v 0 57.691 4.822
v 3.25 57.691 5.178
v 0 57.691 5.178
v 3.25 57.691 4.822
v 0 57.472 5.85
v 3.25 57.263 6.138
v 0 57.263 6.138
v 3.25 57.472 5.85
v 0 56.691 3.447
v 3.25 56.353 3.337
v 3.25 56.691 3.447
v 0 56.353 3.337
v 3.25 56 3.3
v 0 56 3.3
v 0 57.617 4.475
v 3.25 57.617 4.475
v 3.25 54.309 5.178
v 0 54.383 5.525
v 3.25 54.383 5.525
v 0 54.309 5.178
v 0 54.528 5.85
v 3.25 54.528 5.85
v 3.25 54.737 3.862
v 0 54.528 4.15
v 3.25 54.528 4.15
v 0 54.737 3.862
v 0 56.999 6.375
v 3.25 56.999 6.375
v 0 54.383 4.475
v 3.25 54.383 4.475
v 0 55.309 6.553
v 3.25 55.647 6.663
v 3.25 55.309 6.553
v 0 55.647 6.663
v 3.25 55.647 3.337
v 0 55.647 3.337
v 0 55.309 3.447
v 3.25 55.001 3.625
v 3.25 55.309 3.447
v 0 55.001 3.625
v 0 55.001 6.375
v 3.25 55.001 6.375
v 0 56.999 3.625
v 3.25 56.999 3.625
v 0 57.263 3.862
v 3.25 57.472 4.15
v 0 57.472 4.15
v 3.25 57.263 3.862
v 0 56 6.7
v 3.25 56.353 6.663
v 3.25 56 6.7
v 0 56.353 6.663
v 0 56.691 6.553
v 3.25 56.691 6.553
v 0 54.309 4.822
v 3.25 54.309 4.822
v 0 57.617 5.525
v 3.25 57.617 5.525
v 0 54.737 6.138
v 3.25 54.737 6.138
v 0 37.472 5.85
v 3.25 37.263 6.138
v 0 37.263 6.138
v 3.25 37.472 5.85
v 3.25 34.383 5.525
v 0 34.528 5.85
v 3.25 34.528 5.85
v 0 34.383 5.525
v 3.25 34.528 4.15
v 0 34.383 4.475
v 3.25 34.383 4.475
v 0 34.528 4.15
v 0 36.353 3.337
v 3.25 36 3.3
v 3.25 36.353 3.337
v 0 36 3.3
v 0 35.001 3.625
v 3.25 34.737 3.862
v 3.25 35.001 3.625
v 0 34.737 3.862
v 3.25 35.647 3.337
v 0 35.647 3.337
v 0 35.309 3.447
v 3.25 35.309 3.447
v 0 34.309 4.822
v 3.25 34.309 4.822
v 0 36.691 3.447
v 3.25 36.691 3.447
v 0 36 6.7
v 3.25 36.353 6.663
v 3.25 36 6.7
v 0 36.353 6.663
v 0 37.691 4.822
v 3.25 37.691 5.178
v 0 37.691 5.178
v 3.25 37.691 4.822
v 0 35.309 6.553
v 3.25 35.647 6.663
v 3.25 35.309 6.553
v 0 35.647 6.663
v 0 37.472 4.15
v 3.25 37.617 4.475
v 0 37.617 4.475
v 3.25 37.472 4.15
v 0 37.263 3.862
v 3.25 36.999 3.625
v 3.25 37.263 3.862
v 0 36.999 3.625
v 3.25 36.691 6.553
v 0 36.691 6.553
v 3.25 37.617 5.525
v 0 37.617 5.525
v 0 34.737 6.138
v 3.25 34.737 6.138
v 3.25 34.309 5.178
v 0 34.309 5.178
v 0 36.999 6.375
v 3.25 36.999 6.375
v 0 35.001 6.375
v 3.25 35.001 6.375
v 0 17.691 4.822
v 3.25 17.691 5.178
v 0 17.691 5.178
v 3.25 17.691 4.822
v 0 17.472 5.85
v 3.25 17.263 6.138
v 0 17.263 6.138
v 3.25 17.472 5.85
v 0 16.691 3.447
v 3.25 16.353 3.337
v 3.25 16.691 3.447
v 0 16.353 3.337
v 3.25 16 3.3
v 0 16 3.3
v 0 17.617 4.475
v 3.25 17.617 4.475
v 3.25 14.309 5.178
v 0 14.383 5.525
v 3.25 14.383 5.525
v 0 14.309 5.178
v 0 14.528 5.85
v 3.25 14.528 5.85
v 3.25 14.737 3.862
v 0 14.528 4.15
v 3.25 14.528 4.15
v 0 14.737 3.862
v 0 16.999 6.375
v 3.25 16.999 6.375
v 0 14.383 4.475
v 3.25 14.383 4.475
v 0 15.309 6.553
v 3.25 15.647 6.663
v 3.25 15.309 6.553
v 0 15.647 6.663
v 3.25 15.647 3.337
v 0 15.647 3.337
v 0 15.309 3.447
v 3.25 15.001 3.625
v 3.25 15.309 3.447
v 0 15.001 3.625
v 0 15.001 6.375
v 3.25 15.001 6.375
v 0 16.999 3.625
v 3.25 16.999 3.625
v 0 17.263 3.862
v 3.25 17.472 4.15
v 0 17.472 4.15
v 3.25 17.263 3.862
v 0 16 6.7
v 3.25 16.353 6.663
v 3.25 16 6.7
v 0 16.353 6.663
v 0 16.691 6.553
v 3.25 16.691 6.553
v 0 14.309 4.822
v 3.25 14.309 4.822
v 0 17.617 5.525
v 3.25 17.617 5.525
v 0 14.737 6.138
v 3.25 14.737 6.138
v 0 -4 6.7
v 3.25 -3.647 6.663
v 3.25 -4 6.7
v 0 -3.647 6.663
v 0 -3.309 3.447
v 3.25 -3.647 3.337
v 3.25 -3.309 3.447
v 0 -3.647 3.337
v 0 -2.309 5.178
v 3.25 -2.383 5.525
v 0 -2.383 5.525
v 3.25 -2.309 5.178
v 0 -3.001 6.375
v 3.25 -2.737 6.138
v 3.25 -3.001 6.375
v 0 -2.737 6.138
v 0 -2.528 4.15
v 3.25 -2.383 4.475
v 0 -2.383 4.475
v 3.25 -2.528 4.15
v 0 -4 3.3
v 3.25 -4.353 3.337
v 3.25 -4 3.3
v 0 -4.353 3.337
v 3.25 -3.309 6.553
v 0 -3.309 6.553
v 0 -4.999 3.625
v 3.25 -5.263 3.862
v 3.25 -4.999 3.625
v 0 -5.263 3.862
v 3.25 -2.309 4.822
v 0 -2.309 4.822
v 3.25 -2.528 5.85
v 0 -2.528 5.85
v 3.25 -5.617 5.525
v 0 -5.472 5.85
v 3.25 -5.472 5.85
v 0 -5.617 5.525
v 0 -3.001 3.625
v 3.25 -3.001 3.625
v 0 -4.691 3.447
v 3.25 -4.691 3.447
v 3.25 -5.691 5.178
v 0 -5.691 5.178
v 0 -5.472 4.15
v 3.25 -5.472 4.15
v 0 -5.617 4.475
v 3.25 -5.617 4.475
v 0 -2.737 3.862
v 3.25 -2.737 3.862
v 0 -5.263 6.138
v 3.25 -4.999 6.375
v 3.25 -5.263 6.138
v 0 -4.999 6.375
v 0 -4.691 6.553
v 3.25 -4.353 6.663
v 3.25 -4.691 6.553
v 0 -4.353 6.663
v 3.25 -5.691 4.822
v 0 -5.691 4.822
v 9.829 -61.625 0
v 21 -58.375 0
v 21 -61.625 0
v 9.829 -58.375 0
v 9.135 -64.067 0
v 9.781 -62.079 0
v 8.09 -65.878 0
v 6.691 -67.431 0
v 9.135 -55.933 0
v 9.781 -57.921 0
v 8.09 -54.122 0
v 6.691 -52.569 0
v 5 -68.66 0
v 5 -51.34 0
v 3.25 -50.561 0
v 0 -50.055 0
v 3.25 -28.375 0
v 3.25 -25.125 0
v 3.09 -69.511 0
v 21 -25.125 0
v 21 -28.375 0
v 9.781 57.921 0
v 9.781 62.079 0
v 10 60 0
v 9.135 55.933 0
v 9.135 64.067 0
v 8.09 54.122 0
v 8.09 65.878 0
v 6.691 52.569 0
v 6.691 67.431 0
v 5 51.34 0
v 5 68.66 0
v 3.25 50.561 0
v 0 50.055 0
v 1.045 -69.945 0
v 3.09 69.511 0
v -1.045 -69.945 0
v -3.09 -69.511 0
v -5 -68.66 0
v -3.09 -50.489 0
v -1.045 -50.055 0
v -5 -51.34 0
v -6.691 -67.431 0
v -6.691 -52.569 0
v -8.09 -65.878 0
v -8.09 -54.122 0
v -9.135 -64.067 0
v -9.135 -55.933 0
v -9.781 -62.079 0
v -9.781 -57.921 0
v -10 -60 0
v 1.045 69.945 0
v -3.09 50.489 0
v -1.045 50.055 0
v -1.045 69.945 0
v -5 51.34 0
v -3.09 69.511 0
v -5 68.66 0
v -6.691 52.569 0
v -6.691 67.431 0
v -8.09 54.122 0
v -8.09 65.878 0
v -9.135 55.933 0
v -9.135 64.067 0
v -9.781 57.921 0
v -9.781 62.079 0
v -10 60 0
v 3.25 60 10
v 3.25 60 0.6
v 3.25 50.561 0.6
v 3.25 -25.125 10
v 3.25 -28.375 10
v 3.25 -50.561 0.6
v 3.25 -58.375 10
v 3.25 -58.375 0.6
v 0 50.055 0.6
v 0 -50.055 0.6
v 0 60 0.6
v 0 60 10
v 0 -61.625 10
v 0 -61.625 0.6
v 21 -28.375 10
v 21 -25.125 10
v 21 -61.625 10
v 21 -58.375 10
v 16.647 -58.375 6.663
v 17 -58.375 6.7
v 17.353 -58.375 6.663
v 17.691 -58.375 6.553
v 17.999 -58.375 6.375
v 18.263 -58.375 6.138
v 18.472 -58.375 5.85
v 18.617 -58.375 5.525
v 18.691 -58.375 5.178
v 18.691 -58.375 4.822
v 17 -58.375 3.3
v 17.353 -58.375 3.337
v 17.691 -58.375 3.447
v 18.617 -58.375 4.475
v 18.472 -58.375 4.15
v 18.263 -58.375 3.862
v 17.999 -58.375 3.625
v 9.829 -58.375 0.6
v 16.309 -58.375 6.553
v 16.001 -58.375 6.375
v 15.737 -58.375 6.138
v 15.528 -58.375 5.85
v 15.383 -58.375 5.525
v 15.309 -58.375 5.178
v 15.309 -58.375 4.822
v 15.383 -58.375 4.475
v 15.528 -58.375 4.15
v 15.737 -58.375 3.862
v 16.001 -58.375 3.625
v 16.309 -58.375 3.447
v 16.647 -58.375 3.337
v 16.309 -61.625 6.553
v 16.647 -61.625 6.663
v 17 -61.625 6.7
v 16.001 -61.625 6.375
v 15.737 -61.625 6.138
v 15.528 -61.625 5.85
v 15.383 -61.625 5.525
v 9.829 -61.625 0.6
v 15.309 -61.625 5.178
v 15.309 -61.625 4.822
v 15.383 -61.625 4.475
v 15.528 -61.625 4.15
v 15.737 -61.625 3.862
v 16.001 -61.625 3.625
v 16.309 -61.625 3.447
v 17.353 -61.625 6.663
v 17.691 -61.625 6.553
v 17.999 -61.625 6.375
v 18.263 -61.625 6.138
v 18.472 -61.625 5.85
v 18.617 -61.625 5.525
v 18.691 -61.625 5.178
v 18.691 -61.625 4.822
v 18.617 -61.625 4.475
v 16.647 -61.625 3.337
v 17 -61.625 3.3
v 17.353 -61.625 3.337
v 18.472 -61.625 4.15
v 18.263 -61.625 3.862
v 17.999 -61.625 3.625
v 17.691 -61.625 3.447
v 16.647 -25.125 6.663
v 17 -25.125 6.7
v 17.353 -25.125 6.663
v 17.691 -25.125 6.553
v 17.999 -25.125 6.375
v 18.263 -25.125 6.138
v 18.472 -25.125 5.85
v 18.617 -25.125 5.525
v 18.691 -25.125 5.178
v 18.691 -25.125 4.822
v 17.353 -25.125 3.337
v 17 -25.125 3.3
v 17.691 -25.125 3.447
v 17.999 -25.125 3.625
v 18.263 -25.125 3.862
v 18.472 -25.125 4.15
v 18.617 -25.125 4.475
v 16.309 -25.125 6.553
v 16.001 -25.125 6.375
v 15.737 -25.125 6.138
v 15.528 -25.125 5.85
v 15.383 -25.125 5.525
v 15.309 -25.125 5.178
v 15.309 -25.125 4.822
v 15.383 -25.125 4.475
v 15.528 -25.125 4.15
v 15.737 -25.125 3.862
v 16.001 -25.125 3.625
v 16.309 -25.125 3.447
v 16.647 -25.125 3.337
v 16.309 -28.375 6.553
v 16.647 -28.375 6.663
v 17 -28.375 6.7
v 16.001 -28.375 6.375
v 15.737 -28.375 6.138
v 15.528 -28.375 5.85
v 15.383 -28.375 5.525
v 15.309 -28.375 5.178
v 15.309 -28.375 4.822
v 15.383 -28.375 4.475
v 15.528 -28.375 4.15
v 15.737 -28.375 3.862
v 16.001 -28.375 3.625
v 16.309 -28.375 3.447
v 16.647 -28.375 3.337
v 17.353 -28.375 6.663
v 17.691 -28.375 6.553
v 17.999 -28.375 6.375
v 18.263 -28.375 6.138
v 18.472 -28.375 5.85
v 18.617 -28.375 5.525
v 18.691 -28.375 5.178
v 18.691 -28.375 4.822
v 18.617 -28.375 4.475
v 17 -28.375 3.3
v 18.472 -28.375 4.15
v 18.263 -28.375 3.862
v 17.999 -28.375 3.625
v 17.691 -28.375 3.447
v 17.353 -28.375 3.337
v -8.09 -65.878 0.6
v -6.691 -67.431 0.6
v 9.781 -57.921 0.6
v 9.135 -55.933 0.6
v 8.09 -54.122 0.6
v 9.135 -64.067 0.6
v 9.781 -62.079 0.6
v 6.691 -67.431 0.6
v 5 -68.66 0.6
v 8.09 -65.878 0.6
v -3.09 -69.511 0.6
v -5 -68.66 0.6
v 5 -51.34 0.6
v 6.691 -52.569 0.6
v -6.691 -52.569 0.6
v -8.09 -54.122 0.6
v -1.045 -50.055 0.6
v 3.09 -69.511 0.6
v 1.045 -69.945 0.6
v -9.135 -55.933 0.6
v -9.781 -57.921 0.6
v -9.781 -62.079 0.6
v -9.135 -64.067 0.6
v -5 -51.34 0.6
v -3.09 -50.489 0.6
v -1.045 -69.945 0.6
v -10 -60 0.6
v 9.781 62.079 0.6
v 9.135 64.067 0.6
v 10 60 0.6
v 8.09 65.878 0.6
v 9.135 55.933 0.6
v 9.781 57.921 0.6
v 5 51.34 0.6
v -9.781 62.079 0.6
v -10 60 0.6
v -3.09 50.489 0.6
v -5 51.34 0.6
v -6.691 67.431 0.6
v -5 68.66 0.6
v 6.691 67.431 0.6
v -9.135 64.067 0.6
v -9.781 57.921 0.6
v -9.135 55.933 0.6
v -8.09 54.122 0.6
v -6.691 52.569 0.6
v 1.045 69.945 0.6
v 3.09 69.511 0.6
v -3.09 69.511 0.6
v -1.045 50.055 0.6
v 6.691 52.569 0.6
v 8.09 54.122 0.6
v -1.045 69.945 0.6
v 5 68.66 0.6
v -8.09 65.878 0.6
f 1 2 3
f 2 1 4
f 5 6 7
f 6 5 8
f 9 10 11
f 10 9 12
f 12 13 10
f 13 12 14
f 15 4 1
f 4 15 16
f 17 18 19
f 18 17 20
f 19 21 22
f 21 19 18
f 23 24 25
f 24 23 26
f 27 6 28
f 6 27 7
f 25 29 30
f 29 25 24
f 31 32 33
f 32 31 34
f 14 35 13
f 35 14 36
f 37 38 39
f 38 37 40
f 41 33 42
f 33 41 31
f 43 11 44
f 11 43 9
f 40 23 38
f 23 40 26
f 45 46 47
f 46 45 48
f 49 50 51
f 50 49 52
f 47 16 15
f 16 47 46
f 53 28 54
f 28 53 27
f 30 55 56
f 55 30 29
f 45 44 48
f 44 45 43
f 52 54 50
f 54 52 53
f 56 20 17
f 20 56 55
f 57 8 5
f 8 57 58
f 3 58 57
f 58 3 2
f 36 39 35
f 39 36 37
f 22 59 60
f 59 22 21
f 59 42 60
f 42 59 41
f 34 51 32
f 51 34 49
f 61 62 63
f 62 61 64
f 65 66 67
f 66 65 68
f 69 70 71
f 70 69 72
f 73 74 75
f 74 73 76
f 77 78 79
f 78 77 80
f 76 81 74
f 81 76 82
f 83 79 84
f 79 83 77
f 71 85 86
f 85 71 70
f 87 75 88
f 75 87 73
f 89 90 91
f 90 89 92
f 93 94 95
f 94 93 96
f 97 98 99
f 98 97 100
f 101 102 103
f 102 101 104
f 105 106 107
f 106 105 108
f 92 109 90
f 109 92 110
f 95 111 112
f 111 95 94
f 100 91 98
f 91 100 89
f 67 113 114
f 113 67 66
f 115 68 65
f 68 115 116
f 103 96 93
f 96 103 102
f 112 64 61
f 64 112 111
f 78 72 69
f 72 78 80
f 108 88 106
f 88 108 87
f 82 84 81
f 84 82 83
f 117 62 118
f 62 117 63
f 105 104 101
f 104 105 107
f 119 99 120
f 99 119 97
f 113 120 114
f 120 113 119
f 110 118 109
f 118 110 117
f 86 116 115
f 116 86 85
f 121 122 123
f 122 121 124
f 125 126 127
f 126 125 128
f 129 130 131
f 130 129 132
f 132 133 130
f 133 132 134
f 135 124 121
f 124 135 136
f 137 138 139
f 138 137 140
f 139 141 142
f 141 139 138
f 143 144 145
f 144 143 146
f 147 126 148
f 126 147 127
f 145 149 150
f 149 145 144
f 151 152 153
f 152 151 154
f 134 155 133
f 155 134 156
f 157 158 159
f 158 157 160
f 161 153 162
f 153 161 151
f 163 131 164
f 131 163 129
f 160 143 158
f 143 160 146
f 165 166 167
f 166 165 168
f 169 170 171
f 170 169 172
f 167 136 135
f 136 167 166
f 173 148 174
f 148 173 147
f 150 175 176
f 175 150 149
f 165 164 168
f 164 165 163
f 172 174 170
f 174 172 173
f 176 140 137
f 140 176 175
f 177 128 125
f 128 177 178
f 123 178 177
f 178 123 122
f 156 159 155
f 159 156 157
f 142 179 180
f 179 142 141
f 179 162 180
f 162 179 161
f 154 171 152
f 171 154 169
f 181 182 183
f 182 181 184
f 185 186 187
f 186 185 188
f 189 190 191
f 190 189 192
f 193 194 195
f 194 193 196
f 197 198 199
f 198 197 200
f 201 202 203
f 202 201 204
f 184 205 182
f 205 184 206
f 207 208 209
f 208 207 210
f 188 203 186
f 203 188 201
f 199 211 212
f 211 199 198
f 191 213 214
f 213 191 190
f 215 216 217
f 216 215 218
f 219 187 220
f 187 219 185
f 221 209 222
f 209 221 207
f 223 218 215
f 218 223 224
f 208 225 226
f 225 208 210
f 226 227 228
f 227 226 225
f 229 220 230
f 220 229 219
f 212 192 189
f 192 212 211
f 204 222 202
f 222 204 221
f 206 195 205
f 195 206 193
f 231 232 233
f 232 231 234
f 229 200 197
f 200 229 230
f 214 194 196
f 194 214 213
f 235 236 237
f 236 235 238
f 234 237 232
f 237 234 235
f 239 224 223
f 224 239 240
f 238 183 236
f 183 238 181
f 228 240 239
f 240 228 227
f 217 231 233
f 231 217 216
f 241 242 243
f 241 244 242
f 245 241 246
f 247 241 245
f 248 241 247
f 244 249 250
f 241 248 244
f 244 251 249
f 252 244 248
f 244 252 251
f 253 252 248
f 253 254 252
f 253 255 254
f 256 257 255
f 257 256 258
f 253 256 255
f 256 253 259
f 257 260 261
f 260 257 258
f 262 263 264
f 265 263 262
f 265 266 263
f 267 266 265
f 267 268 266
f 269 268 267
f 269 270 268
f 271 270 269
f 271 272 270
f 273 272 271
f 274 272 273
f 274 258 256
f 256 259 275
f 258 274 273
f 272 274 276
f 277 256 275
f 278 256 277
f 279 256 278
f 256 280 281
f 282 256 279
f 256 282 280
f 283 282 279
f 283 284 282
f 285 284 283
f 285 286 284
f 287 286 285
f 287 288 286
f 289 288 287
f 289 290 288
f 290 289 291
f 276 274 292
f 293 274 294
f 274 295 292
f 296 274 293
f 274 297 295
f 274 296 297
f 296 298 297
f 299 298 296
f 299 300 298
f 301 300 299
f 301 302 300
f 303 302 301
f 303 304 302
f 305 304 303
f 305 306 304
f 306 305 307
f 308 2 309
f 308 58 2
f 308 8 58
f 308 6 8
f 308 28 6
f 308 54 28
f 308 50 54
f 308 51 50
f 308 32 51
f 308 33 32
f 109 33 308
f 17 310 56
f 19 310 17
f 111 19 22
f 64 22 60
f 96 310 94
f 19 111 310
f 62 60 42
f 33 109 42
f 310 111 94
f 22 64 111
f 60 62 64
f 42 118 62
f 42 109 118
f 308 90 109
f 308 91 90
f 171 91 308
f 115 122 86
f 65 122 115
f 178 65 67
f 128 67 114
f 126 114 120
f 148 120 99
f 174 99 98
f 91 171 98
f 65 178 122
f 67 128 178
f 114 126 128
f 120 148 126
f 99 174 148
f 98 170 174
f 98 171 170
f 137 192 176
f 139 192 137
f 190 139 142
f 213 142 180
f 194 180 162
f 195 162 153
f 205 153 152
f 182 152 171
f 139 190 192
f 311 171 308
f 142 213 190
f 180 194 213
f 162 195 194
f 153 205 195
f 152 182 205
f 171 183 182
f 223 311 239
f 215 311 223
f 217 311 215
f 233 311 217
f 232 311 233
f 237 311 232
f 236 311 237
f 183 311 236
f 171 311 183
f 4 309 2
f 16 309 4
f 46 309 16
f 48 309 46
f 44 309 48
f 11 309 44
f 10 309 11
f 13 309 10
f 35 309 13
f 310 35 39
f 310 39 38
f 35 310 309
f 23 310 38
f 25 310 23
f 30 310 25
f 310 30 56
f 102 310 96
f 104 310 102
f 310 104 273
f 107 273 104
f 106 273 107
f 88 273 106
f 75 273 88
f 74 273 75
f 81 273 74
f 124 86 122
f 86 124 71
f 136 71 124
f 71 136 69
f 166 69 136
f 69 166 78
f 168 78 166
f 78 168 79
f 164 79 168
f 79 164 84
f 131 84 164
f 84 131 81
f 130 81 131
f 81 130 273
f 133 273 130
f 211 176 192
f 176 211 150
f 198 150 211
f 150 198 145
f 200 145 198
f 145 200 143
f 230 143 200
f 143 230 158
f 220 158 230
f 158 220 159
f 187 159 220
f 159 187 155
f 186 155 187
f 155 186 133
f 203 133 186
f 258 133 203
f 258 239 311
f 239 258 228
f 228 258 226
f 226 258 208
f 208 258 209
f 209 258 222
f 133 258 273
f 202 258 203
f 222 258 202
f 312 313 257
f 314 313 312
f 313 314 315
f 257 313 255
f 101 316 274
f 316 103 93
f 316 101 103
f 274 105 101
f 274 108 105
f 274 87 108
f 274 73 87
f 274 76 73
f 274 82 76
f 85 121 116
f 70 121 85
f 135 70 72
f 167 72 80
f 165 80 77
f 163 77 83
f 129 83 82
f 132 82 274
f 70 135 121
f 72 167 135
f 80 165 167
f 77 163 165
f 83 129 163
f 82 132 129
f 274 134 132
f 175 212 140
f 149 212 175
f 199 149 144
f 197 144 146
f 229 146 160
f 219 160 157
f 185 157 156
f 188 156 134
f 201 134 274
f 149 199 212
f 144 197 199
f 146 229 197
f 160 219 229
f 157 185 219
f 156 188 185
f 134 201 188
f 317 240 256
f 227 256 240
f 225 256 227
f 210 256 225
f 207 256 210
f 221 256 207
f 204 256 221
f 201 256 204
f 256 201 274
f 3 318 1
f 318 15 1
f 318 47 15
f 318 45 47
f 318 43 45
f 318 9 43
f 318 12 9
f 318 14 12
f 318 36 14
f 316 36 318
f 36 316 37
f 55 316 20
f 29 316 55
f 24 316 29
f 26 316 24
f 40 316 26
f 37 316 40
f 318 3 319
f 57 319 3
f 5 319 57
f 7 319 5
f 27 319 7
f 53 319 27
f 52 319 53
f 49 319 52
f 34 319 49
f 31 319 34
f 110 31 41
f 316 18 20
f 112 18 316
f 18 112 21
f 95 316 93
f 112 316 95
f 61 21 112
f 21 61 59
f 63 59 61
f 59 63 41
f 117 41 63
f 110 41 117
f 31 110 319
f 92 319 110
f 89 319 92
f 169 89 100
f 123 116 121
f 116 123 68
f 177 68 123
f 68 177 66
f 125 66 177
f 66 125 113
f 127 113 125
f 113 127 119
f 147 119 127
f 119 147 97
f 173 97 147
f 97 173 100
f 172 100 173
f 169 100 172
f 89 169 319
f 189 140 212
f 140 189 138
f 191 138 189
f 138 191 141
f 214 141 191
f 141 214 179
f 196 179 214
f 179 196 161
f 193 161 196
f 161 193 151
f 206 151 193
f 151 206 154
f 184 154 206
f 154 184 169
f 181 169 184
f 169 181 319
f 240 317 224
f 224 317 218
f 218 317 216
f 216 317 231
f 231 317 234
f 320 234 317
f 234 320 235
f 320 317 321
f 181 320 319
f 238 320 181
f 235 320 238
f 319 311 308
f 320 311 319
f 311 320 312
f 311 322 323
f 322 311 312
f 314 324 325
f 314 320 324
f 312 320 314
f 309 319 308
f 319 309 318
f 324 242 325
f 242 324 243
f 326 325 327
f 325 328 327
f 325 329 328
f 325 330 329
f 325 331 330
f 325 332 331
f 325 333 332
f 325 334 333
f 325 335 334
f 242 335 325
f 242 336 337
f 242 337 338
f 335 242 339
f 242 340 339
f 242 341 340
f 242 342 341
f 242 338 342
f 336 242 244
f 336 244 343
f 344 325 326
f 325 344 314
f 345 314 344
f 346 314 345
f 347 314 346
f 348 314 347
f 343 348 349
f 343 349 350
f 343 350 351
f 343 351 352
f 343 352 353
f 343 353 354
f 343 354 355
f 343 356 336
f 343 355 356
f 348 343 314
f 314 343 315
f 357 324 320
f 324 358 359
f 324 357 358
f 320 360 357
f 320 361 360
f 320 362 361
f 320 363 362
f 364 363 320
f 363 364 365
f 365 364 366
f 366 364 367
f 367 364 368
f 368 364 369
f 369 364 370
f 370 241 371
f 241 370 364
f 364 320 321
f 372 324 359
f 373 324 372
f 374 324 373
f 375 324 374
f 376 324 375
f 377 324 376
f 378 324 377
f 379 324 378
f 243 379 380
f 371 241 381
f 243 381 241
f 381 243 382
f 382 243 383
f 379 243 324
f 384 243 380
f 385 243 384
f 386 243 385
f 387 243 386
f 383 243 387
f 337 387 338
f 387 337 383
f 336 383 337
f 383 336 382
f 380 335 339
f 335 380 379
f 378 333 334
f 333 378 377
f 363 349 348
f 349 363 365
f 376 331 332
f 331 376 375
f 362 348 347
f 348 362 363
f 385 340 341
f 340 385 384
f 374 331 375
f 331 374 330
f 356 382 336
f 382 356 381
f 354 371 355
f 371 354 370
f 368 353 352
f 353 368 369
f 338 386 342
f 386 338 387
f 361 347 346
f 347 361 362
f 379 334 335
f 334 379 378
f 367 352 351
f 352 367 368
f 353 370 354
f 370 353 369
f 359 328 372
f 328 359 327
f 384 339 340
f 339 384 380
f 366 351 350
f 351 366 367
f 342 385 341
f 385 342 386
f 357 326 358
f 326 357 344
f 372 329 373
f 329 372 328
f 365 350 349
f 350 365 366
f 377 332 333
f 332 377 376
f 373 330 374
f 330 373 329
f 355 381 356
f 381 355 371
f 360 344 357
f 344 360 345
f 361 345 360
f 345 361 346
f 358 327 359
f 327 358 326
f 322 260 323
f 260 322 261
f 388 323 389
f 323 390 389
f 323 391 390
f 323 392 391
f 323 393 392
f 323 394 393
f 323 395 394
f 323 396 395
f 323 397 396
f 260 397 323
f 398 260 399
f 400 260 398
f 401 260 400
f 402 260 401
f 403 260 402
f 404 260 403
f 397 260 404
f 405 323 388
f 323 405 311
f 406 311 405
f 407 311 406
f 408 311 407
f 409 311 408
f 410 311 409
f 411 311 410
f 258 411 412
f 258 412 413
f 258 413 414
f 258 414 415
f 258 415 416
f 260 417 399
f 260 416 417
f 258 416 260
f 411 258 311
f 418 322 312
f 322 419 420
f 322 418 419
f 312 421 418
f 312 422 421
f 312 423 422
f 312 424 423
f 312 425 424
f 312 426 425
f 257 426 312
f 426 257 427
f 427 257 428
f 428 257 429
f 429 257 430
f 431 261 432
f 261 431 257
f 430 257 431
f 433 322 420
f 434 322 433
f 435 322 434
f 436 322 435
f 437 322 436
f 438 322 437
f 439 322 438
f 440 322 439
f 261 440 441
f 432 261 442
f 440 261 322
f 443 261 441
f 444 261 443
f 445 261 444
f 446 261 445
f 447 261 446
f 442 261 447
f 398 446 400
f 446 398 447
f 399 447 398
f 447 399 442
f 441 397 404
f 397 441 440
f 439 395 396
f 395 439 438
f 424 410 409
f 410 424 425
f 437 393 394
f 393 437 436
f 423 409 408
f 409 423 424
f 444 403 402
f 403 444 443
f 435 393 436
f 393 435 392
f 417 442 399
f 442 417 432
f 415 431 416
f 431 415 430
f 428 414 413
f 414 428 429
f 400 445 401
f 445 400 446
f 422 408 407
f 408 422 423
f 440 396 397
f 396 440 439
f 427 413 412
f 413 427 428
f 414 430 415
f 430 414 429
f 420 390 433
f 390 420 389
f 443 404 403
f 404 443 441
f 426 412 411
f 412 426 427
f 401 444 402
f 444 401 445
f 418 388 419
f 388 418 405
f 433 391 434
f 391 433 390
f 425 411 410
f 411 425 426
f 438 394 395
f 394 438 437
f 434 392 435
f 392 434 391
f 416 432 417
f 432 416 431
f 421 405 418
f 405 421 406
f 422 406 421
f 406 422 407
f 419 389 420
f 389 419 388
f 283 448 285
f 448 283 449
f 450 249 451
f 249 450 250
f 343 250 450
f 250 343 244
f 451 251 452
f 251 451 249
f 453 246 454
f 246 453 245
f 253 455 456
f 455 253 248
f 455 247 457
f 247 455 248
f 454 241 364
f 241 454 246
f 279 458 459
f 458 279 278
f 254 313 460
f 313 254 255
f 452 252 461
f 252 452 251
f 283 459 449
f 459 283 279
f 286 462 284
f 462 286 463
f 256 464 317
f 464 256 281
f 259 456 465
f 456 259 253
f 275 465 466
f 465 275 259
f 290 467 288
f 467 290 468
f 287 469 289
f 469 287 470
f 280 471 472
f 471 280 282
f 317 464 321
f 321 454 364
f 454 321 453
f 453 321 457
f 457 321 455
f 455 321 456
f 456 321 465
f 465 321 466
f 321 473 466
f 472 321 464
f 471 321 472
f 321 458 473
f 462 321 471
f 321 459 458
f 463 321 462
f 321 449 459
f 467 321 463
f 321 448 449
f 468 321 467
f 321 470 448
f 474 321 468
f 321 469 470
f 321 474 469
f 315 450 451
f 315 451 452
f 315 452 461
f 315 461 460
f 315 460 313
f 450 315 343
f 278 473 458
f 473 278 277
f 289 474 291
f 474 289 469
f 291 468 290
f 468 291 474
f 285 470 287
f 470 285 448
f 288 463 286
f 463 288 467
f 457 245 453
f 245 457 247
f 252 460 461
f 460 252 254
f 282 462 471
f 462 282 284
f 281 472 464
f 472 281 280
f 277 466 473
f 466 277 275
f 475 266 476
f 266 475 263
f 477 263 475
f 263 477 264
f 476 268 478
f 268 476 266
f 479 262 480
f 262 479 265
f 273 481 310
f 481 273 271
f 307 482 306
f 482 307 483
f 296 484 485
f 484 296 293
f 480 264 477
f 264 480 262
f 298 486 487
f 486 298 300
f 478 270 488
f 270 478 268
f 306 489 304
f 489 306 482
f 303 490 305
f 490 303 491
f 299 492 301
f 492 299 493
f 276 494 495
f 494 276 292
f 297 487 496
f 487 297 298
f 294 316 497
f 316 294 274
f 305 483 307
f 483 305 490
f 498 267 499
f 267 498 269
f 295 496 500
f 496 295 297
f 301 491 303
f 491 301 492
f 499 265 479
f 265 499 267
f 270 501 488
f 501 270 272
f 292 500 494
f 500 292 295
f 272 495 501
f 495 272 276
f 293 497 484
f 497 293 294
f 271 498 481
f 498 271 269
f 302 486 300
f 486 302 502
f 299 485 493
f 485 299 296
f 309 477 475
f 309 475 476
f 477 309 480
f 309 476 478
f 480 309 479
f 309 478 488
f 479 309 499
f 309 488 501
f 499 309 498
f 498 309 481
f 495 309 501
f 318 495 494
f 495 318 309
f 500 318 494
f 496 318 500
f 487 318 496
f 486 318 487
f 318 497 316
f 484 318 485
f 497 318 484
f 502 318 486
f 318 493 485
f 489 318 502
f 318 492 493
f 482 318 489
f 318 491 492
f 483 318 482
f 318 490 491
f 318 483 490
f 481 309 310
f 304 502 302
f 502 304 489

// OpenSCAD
//////////////////////////////////////////
// tbs discovery FPV top camera mount, LEFT SIDE, LONGER ARM, V2
//////////////////////////////////////////

module helperDisk(diameter) {
translate([0, 0, 0.3]) {
	cylinder(r = diameter/2, h = 0.6, center = true);
}
}

totalL = 120;
plateThick = 3.25;
frameThick = 10;
m3Rad = 3.4/2;
frameHoleD = 40;
frameH=21;
nholes=3;

translate([0,0,frameThick/2]){//translate all
rotate([0,90,0]){

translate([0,0,plateThick/2]){

difference(){
cube(size = [frameThick,totalL,plateThick], center = true);

for(i=[0:nholes]){
translate([0,totalL/2-4-i*frameHoleD/2,0]){ cylinder(h = 5, r=m3Rad, $fn=30, center=true); }
}

}//diff
}//translate

translate([0,-(totalL/2-15-plateThick/2),frameH/2]){
for(i = [-1,1]){
translate([0,i*(15+plateThick/2),0]){ 
	difference(){
	cube(size = [frameThick,plateThick,frameH], center = true); 
	translate([0,0,frameH/2-4]){ rotate([90,0,0]){cylinder(h = 5, r=m3Rad, $fn=30, center=true);} }
	}//diff
}
}

}//translate

}//rotate
}//translate all

for(i=[-1,1]){
translate([0,i*(totalL/2),0]) { helperDisk(20); }
}
